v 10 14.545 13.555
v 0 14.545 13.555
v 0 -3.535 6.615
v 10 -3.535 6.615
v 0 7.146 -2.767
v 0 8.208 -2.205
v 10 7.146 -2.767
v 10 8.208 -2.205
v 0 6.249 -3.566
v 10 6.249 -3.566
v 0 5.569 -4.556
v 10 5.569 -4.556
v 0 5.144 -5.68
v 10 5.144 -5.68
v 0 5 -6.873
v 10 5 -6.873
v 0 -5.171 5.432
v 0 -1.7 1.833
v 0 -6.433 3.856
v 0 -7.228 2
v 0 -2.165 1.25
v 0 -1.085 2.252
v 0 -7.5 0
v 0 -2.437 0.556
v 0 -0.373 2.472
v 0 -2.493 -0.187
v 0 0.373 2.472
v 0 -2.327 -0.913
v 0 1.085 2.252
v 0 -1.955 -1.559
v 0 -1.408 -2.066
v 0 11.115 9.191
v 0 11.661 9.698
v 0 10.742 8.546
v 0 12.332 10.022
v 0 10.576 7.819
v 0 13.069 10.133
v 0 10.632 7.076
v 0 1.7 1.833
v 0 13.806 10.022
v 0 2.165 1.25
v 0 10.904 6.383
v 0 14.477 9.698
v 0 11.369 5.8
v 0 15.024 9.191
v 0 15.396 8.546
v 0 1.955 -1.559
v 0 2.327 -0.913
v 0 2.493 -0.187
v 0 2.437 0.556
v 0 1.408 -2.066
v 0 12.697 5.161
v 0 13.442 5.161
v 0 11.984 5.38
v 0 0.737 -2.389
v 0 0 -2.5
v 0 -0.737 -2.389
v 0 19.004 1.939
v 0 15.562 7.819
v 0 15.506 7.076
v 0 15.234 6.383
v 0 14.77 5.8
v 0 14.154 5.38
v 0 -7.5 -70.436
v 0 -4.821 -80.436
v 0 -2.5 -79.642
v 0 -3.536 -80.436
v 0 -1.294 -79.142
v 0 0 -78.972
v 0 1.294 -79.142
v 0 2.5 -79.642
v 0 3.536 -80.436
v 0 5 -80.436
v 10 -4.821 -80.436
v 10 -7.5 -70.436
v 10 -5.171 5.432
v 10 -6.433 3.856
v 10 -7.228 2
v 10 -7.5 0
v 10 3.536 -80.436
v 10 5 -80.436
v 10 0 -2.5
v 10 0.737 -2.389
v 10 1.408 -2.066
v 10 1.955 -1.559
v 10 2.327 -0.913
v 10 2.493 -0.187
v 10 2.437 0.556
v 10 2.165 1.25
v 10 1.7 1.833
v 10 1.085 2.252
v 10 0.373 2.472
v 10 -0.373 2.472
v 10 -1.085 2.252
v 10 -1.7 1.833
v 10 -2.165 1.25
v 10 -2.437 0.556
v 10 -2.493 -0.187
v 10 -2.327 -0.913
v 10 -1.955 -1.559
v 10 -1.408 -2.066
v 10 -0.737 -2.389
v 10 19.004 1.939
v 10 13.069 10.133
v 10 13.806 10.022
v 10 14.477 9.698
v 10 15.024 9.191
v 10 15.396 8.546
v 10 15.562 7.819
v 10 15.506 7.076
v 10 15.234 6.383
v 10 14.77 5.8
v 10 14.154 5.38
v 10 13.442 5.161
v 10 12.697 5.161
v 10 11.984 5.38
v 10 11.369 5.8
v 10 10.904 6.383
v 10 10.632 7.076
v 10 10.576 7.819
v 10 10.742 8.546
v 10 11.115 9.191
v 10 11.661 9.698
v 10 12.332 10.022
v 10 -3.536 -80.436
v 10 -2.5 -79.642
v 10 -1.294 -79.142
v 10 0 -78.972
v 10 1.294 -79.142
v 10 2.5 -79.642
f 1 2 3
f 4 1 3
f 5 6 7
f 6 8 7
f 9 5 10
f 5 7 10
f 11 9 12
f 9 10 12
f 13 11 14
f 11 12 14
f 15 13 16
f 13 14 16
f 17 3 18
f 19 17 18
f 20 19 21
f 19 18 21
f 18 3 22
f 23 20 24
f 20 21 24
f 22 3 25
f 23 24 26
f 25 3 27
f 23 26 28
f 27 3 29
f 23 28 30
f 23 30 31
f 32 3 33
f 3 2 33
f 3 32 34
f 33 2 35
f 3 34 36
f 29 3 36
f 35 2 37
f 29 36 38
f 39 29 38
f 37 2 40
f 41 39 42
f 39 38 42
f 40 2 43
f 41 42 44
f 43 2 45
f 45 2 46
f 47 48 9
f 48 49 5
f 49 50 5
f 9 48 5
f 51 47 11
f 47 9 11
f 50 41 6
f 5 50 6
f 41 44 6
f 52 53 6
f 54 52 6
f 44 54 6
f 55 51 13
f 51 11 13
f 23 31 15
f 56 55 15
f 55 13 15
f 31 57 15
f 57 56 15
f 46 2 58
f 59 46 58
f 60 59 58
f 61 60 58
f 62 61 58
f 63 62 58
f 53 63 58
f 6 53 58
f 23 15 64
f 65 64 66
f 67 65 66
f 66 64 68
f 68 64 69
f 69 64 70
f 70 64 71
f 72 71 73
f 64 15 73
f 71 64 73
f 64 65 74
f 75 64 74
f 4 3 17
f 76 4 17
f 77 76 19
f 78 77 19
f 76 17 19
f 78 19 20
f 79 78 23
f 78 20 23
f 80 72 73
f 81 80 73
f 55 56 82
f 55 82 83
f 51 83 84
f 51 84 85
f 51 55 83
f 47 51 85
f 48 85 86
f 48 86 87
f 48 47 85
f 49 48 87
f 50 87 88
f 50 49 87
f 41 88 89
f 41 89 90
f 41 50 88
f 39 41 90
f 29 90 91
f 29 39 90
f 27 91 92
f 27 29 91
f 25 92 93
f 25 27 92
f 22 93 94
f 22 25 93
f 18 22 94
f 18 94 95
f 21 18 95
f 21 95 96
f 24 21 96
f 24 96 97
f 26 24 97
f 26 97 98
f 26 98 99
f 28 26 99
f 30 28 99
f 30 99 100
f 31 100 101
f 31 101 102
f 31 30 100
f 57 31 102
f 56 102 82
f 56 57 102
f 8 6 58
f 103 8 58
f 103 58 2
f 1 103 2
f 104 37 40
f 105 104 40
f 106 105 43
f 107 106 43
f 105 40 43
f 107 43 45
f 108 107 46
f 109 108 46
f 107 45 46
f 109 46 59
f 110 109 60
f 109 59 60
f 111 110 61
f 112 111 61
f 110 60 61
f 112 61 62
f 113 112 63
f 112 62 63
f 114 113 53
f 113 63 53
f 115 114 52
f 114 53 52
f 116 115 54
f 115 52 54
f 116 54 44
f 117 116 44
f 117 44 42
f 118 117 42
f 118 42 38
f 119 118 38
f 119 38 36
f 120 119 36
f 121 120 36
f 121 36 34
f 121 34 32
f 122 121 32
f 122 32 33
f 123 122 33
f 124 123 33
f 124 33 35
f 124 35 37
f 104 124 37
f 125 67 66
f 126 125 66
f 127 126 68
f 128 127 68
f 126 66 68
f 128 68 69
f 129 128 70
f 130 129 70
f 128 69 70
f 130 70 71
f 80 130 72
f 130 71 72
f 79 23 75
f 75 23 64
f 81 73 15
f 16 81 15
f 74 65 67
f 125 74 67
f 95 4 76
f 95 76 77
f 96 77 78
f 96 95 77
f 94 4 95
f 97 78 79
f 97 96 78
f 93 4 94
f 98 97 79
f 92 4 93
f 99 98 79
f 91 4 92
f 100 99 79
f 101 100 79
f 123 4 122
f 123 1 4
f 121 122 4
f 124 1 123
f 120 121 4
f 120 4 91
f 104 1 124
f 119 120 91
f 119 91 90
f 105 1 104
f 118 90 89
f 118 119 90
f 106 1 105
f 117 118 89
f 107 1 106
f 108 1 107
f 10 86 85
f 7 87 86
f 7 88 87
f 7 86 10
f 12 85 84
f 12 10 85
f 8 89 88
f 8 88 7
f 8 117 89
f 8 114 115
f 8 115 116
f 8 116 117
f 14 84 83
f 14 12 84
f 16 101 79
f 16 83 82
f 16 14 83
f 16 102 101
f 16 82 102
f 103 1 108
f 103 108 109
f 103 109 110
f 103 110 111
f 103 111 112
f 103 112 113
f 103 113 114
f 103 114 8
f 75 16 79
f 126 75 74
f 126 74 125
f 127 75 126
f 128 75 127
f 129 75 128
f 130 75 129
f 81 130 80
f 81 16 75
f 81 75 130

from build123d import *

# Parameters (mm, degrees)
SKETCH_1_R          = 2.5
EXTRUDE_1_DEPTH     = 10
FILLET_1_R          = 5
CUT_EXTRUDE_1_REACH = 85.254
SKETCH_2_R          = 2.5
CHAMFER_1_SIZE      = 10
CHAMFER_1_SIZE2     = 2.679491924


with BuildPart() as part:
    # 草圖1 → 填料-伸長1 (new body)
    with BuildSketch(Plane(origin=(0, 0, 0), x_dir=(0, 0, -1), z_dir=(1, 0, 0))):
        with BuildLine():
            Line((0, -7.5), (80.436404793, -7.5))
            Line((80.436404793, -7.5), (80.436404793, -3.535533906))
            ThreePointArc((80.436404793, -3.535533906), (78.971938699, 0), (80.436404793, 3.535533906))
            Line((80.436404793, 3.535533906), (80.436404793, 5))
            Line((80.436404793, 5), (3.436404793, 5))
            Line((3.436404793, 5), (-1.93911445, 19.003706397))
            Line((-1.93911445, 19.003706397), (-13.554844706, 14.544845311))
            Line((-13.554844706, 14.544845311), (-6.614588023, -3.535141479))
            ThreePointArc((-6.614588023, -3.535141479), (-3.85593302, -6.43286721), (0, -7.5))
        make_face()
        Circle(SKETCH_1_R, mode=Mode.SUBTRACT)
    extrude(amount=EXTRUDE_1_DEPTH)

    # 圓角1
    fillet_1_edges = [part.edges().sort_by_distance(p)[0] for p in [
        (5, 5, -3.436404793),
    ]]
    fillet(fillet_1_edges, radius=FILLET_1_R)

    # 草圖2 → 除料-伸長1 (cut, up to next)
    with BuildSketch(Plane.ZY, mode=Mode.PRIVATE) as cut_extrude_1_sk1:
        with Locations((7.632654751, 13.069153566)):
            Circle(SKETCH_2_R)
    cut_extrude_1_tool1 = extrude(cut_extrude_1_sk1.sketch, amount=-CUT_EXTRUDE_1_REACH, mode=Mode.PRIVATE) & part.part
    add(cut_extrude_1_tool1.solids().sort_by_distance((0, 13.069154, 7.632655))[0], mode=Mode.SUBTRACT)

    # 導角1
    chamfer_1_edges = [part.edges().sort_by_distance(p)[0] for p in [
        (5, -7.5, -80.436404793),
    ]]
    chamfer_1_side = [part.faces().sort_by_distance(p)[0] for p in [
        (5, -7.5, -40.218202397),
    ]]
    chamfer(chamfer_1_edges, length=CHAMFER_1_SIZE, length2=CHAMFER_1_SIZE2, reference=chamfer_1_side[0])


solid = part.part
